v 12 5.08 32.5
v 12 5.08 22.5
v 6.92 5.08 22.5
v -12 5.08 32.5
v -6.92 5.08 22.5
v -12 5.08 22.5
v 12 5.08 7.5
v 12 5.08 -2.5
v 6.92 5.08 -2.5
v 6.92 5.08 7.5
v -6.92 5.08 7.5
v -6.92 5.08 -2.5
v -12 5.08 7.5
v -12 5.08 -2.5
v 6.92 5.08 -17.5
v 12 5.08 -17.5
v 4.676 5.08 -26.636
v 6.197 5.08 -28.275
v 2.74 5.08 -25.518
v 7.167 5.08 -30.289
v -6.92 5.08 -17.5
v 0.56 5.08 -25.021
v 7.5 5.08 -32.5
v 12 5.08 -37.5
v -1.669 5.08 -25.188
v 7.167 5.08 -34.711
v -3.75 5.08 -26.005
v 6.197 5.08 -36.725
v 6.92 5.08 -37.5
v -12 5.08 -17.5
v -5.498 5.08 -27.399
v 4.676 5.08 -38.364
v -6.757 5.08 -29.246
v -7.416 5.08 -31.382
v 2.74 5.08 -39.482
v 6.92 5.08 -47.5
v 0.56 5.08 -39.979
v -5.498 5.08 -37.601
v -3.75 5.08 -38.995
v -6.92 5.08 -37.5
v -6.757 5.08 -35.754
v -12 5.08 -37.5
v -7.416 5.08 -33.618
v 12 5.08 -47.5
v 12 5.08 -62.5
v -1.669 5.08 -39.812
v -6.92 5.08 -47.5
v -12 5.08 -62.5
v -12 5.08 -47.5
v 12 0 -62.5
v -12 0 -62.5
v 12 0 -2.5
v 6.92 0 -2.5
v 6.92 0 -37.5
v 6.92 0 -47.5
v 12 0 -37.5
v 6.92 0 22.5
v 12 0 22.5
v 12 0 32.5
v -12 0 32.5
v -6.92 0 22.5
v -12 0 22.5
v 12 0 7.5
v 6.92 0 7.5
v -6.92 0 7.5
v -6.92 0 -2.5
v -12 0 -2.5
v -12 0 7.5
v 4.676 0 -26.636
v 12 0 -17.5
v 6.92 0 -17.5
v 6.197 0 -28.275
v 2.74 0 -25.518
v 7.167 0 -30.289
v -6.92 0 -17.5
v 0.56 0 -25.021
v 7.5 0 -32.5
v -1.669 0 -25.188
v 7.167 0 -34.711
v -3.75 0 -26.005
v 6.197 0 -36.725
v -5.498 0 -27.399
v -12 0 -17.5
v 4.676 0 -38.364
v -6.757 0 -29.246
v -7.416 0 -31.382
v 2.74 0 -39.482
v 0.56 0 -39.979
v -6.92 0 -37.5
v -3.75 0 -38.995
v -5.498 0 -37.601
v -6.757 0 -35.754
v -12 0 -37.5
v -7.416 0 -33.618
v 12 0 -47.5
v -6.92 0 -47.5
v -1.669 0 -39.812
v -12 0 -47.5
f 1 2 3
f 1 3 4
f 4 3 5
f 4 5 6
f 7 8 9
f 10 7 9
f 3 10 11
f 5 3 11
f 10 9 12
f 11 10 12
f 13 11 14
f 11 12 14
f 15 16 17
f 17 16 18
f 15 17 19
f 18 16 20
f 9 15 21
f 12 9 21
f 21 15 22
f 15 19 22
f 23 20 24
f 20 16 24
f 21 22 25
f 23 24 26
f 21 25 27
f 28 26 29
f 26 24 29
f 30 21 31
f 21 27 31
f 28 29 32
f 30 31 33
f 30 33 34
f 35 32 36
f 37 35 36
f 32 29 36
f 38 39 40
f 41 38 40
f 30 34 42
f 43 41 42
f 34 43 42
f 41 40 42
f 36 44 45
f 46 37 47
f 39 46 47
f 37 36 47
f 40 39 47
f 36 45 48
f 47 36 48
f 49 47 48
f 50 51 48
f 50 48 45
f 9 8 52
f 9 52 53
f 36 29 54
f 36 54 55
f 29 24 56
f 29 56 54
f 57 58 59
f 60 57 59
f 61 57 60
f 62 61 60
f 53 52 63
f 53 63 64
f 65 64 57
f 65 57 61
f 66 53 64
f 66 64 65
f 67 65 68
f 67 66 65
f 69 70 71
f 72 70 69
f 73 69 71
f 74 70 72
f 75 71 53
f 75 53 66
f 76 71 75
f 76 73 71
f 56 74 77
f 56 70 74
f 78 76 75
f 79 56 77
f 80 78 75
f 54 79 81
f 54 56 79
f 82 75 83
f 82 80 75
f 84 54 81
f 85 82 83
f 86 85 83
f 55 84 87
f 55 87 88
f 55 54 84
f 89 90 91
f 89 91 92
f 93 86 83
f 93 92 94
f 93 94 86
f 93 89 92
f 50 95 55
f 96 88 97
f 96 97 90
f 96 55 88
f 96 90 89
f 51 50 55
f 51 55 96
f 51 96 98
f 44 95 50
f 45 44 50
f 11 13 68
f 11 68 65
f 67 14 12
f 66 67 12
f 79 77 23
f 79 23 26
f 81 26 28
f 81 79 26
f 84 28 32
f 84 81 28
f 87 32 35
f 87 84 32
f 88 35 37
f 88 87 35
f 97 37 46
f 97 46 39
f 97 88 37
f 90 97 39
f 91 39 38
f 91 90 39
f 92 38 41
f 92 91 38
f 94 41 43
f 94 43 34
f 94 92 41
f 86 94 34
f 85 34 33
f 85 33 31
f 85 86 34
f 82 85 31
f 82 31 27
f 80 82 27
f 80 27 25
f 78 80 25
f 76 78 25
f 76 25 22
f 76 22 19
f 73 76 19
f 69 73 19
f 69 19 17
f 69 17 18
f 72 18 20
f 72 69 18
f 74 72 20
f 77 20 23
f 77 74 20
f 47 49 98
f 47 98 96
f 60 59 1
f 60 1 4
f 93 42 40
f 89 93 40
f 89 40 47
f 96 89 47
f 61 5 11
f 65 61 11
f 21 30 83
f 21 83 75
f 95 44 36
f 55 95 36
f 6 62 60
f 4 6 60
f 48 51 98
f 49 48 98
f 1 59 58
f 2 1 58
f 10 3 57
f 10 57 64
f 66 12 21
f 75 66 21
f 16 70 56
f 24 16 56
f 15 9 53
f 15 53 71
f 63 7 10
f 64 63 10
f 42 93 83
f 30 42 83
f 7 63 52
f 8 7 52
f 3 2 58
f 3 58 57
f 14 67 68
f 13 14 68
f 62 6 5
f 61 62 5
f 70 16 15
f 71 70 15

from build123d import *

# Parameters (mm, degrees)
SKETCH1_R           = 7.5
BOSS_EXTRUDE1_DEPTH = 5.08
SKETCH2_W           = 5.08
SKETCH2_H           = 10
SKETCH2_H_2         = 15
CUT_EXTRUDE1_DEPTH  = 5.08


with BuildPart() as part:
    # Sketch1 → Boss-Extrude1 (new body)
    with BuildSketch(Plane(origin=(0, 0, 0), x_dir=(1, 0, 0), z_dir=(0, 1, 0))):
        Polygon((12, -32.5), (-12, -32.5), (-12, 32.5), (-12, 62.5), (12, 62.5), (12, 32.5), align=None)
        with Locations((0, 32.5)):
            Circle(SKETCH1_R, mode=Mode.SUBTRACT)
    extrude(amount=BOSS_EXTRUDE1_DEPTH)

    # Sketch2 → Cut-Extrude1 (cut)
    with BuildSketch(Plane(origin=(0, 5.08, 0), x_dir=(1, 0, 0), z_dir=(0, 1, 0))):
        with Locations((-9.46, 42.5)):
            Rectangle(SKETCH2_W, SKETCH2_H)
        with Locations((-9.46, -15)):
            Rectangle(SKETCH2_W, SKETCH2_H_2)
        with Locations((-9.46, 10)):
            Rectangle(SKETCH2_W, SKETCH2_H_2)
    cut_extrude1 = extrude(amount=-CUT_EXTRUDE1_DEPTH, mode=Mode.SUBTRACT)

    # Mirror2: Cut-Extrude1 across plane
    add(cut_extrude1.mirror(Plane(origin=(0, 0, 0), x_dir=(0, 0, 1), z_dir=(1, 0, 0))), mode=Mode.SUBTRACT)


solid = part.part
